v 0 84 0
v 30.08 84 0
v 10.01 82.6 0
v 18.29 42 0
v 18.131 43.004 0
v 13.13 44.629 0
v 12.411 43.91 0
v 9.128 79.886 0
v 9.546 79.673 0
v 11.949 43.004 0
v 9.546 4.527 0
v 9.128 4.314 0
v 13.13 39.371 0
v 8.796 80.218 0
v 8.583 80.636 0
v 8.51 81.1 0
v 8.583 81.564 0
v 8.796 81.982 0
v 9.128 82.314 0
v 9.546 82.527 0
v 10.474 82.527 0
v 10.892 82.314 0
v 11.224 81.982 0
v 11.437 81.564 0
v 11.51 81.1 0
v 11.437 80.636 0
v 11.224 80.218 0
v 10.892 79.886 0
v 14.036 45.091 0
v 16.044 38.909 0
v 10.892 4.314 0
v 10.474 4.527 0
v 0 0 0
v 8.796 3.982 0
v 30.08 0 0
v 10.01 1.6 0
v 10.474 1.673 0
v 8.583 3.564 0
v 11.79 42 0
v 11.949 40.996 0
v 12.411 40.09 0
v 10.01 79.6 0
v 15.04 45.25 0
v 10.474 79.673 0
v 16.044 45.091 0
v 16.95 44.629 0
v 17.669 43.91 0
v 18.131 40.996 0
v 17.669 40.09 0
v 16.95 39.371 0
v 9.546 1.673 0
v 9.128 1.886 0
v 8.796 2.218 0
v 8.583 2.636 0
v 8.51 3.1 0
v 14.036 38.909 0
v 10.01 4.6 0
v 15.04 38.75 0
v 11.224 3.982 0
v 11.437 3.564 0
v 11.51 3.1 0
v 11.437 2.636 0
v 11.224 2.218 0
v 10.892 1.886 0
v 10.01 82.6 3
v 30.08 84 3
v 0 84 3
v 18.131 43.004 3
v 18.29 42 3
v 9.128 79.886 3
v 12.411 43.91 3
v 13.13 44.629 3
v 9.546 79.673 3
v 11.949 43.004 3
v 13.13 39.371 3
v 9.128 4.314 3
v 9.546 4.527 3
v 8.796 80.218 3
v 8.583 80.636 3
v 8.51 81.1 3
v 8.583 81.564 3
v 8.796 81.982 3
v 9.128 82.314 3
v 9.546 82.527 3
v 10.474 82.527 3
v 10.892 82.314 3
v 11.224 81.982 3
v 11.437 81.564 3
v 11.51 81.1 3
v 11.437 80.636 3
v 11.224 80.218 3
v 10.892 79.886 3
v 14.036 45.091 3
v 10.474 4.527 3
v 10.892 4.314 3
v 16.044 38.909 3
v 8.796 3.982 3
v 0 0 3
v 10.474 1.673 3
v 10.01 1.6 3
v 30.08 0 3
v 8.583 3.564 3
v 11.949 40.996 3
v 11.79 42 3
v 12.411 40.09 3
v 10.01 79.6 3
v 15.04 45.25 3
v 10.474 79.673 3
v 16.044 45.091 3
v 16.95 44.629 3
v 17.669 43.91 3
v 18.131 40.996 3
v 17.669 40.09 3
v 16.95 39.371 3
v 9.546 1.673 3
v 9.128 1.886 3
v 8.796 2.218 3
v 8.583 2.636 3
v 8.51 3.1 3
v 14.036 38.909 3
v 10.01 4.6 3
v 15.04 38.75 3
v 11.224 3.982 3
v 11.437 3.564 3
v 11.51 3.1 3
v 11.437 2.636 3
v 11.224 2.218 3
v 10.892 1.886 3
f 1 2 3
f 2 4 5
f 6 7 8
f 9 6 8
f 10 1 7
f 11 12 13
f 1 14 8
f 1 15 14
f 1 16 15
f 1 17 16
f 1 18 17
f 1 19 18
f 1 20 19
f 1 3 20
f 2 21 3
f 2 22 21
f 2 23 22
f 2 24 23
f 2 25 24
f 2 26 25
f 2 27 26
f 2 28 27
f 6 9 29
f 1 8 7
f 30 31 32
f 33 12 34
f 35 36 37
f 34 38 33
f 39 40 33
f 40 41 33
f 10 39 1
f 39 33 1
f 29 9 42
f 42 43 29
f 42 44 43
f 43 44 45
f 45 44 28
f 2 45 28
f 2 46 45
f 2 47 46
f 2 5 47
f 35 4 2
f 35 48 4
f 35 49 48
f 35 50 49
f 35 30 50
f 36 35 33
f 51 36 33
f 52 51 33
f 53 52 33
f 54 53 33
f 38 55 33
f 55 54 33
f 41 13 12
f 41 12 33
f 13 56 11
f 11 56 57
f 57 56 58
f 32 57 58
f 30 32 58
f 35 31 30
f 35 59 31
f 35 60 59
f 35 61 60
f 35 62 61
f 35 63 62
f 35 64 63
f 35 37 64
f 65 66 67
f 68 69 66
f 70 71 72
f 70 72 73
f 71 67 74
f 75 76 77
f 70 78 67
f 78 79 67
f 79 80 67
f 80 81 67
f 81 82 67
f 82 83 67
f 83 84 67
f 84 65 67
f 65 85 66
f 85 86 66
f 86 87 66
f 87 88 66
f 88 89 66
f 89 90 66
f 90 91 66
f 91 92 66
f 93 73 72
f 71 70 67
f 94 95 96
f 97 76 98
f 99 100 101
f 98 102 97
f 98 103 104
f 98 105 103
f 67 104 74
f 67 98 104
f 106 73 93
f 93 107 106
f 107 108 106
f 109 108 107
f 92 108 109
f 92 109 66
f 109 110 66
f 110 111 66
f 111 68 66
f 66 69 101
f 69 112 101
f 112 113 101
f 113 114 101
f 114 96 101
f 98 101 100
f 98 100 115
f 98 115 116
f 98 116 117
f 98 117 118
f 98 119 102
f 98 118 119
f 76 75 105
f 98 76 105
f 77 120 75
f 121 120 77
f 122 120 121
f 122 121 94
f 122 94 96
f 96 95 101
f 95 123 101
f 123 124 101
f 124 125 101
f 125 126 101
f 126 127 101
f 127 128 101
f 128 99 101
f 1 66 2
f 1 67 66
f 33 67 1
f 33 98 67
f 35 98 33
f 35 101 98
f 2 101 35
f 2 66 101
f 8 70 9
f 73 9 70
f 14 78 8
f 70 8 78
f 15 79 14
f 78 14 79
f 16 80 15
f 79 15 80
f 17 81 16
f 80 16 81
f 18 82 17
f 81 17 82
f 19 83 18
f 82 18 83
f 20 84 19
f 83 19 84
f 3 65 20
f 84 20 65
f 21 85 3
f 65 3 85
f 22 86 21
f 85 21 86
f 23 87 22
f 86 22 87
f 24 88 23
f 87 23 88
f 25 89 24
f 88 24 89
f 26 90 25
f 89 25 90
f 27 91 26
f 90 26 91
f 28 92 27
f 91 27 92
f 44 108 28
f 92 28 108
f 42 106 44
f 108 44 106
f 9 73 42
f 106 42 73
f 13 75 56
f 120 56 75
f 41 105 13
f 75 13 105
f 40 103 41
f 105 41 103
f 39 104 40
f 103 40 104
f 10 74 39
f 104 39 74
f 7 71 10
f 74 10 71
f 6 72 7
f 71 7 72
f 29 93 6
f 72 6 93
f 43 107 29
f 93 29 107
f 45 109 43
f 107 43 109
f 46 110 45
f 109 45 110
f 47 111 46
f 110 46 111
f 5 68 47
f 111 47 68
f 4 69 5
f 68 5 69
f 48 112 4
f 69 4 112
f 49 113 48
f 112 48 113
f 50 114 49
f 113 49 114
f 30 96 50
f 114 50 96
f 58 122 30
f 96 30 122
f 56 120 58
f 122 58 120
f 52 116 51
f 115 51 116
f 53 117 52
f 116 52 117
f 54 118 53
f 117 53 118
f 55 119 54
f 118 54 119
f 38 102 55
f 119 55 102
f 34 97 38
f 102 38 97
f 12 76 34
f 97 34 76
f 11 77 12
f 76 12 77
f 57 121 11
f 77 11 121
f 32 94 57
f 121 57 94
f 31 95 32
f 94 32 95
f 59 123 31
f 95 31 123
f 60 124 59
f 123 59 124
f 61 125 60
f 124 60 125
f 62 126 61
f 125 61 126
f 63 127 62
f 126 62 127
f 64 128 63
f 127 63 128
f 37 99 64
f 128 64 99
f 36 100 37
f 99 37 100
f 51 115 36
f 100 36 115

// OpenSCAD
// file: panel.scad
$fn = 20;
U = 3;
T = 16;

h = U * 44.5 - 5;
w = T * 5.08 - 2*.2;

m_x = 7.47;
//m_x = 0;
m_y = 3.1;
m_d = 3;

F = U * 44.5 + (122.5 - 3 * 44.5);

echo(w);

module hole() {
//    hull() {
    //circle(d=m_d);
    translate([5.08/2,0]) circle(d=m_d);
//    }
}

module holes() {
    translate([m_x, m_y]) hole();
    translate([m_x, m_y + F]) hole();
}

module panel() {
    difference() {
    square([w, h]);
        holes();
        if(T>6) {
            translate([(T-3) * 5.08 - 5.08, 0]) holes();
        }
        translate([(T-24) * 5.08, 0]) holes();
    }
}

//panel();

//#square([46,62]);
//#import("jr-module-bay-cover.stl");
// main file
b_w = 13;
b_h = 20;

include <panel.scad>

T=6;
U = 2;

difference() {
    linear_extrude(3)
    difference() {
    panel();
    translate([w/2,h/2])
   
    intersection() {
        circle(d=6.5, true);
        //square([20,22],true);
    }

    }

}
